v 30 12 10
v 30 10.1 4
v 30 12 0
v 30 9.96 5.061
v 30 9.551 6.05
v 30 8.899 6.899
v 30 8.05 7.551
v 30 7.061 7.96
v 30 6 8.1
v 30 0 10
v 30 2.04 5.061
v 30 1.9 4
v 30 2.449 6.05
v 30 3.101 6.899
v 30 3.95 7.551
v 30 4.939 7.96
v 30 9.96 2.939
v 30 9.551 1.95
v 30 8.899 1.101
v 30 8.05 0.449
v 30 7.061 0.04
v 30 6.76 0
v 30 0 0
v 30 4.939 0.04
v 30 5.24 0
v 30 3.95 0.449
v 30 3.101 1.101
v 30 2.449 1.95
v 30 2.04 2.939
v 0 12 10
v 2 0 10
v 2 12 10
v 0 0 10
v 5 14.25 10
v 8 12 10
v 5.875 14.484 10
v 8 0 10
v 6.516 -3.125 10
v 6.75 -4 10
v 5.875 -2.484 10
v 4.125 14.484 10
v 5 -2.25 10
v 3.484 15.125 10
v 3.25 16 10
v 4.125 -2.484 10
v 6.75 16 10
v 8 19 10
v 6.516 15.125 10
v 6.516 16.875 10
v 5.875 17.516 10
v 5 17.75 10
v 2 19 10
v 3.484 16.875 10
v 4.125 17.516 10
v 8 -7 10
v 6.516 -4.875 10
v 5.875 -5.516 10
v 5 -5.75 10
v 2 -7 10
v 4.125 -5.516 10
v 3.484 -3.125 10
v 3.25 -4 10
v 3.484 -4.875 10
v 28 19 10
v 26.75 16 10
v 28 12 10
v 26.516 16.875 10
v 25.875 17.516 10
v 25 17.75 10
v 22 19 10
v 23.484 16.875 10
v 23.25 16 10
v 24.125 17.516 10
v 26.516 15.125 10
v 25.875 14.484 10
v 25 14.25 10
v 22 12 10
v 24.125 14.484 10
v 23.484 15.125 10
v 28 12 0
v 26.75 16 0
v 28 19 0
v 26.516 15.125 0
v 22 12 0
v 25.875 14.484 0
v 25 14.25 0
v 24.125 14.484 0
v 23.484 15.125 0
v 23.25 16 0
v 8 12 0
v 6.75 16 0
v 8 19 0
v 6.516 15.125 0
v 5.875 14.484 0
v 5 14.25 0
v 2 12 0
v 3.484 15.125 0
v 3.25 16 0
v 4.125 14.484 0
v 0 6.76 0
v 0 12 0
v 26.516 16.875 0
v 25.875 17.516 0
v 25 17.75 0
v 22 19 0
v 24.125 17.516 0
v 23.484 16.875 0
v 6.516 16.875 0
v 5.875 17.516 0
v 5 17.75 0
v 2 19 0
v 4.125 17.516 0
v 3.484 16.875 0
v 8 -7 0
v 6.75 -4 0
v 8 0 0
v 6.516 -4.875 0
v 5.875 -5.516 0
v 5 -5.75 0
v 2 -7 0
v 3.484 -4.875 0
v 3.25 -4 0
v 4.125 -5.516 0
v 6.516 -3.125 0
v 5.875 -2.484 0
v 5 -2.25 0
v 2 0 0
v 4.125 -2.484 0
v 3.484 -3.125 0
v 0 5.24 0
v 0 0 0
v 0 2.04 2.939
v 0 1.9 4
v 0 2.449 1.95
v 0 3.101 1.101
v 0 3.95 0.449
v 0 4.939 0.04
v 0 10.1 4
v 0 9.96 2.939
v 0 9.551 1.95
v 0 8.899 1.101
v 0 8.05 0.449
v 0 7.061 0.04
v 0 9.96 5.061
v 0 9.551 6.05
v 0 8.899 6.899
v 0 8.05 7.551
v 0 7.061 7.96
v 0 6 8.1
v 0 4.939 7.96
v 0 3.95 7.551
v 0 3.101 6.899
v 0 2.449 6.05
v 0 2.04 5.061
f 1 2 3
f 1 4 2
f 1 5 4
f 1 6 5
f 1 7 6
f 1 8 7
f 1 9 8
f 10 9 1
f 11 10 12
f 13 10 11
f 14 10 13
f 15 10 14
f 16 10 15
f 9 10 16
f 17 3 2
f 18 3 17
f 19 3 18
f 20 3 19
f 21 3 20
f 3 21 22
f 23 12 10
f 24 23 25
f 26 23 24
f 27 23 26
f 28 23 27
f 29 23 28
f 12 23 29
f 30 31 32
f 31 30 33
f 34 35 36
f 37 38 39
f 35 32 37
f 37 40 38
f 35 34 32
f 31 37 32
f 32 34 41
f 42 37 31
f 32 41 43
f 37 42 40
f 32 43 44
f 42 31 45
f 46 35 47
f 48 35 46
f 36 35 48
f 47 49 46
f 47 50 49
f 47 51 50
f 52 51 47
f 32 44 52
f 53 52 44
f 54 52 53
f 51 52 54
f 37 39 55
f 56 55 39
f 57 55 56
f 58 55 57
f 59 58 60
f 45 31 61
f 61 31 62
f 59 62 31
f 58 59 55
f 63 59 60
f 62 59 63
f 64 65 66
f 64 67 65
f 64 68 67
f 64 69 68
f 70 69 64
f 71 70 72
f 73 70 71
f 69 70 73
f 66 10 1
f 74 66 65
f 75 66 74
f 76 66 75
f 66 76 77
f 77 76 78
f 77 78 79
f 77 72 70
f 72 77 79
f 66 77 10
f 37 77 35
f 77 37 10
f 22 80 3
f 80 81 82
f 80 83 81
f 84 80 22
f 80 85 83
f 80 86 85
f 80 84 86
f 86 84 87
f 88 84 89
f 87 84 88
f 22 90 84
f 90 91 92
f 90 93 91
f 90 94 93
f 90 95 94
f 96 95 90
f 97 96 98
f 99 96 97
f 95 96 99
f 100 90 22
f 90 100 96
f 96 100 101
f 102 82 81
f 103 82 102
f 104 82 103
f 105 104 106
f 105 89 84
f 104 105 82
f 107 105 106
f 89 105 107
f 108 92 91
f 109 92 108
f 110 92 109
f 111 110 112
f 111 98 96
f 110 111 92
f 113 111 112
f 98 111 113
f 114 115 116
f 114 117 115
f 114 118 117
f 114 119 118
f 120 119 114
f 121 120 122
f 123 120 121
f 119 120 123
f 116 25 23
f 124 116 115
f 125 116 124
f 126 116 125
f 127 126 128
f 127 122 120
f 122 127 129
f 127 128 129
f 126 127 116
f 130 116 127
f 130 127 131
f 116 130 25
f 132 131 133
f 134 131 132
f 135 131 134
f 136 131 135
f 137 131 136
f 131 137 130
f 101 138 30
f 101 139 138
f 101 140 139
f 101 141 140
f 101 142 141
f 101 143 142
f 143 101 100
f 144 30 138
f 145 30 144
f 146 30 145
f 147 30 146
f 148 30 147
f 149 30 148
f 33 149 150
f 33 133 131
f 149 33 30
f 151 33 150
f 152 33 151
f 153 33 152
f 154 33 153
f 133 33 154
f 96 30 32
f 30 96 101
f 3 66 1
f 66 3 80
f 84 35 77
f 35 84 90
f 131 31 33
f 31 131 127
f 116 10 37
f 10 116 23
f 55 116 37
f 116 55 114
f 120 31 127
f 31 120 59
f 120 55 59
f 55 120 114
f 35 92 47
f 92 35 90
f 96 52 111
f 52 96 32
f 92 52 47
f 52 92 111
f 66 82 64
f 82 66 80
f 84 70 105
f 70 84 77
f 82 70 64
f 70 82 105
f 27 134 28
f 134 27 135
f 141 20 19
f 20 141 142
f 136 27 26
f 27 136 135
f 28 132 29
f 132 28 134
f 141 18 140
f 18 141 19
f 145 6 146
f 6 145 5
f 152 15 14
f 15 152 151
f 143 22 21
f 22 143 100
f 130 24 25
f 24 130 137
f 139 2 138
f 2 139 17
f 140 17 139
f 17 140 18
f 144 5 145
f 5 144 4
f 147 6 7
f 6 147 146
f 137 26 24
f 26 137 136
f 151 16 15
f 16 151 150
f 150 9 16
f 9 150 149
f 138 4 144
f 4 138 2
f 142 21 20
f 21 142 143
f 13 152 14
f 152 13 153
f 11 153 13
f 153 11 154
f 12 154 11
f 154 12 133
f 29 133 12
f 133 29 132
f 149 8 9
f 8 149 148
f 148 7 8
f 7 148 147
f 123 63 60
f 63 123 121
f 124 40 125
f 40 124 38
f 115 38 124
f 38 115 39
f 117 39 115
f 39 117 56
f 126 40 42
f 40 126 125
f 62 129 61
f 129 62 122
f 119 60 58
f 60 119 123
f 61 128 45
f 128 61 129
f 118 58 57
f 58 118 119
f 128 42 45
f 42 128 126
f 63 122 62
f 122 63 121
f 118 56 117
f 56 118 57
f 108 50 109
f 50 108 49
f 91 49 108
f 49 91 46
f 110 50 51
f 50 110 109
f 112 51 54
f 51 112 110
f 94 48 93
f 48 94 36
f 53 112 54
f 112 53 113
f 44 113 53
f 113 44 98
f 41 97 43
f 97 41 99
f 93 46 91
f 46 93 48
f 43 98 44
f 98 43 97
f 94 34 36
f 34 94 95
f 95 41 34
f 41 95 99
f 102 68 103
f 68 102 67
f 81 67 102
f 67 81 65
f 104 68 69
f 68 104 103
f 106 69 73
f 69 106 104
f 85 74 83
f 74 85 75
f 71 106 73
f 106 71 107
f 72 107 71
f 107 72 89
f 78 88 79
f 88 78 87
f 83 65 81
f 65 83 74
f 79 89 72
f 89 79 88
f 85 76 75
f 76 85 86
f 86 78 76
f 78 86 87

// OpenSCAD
difference()
{
    union()
    {
        cube([30,12,10]);
        
        translate([2,-4-3,0])
            cube([6,8,10]);
            //cylinder(d=3.5,h=4,$fn=12);
        translate([2,11,0])
            cube([6,8,10]);
        translate([2+20,11,0])
            cube([6,8,10]);
    }
    union()
    {
        translate([0,6,4])
            rotate([0,90,0])
                cylinder(d=8.2,h=30,$fn=24);
        
        translate([5,-4,0])
            cylinder(d=3.5,h=10,$fn=12);
        translate([5,6+6+4,0])
            cylinder(d=3.5,h=10,$fn=12);
        translate([5+20,6+6+4,0])
            cylinder(d=3.5,h=10,$fn=12);
    }
}
